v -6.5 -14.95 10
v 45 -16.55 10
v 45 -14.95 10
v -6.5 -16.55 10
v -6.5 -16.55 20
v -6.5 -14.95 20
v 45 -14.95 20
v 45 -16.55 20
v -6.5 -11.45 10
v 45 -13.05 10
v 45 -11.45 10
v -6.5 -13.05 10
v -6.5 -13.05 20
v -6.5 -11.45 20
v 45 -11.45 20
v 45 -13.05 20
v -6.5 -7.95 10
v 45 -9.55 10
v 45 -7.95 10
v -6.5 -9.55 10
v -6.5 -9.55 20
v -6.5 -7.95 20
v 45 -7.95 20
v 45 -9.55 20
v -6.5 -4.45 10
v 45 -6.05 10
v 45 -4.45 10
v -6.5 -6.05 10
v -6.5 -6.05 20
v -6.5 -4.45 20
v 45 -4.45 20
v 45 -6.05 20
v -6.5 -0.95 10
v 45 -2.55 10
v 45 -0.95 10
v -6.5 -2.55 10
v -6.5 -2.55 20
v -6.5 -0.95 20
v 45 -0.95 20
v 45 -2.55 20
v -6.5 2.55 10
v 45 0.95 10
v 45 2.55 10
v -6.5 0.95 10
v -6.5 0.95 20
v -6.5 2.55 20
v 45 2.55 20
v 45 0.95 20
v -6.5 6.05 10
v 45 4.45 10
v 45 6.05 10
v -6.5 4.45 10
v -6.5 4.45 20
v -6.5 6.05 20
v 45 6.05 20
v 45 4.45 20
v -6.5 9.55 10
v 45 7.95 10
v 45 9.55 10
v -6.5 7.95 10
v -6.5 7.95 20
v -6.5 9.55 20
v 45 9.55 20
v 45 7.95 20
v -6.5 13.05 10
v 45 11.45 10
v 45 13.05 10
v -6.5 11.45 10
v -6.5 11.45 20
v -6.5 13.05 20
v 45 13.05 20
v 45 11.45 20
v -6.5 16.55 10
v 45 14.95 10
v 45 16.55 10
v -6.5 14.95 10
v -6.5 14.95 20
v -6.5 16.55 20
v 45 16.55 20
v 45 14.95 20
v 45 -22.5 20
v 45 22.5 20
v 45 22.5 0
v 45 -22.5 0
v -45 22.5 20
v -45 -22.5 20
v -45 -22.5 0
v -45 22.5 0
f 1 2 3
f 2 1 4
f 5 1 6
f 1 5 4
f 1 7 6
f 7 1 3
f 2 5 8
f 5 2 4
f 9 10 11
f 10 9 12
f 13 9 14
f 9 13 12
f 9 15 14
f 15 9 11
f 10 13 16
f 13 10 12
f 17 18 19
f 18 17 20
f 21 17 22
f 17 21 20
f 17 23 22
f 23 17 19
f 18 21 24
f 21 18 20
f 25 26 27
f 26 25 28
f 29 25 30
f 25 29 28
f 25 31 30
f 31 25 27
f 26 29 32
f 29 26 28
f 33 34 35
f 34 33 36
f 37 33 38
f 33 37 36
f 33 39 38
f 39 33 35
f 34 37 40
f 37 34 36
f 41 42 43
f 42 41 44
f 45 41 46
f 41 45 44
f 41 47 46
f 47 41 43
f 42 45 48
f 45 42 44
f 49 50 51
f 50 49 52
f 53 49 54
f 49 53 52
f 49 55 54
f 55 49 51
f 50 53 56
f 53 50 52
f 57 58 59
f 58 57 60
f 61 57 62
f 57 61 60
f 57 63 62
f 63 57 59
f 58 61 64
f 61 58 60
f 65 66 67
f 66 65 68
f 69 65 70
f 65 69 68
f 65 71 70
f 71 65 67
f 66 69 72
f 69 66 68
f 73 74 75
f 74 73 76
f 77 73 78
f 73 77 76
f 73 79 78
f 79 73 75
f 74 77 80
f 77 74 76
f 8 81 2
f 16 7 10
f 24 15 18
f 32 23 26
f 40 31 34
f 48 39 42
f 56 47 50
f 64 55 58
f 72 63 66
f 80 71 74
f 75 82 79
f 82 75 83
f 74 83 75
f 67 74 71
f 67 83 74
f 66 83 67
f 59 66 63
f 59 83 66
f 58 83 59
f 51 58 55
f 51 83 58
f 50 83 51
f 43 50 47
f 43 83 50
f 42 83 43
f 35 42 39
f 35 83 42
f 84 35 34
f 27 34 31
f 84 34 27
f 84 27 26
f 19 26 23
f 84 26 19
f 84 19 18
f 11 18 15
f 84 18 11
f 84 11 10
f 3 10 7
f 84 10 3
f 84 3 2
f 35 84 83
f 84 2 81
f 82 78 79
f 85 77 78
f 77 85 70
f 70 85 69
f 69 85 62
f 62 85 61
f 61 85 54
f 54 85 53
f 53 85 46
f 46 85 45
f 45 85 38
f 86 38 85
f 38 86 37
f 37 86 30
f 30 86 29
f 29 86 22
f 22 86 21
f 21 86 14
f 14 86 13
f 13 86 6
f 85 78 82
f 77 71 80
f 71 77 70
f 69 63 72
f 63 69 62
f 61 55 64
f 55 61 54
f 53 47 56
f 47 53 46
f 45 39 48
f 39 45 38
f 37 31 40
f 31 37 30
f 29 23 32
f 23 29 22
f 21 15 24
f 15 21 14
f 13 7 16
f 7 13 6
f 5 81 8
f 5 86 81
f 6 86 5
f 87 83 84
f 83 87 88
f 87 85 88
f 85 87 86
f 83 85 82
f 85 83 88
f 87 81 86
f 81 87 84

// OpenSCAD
// Slide drying rack
// Print orientation: base block on XY plane, slots open upward (+Z)

// ---------- Block ----------
block_l = 90;    // block length along X (mm)
block_w = 45;    // block width along Y (mm)
block_h = 20;    // block height along Z (mm)

// ---------- Slots ----------
slot_n     = 10;   // number of slide slots
slot_len   = 77;   // slot length along X (mm)
slot_w     = 1.6;  // slot width along Y (mm)
slot_d     = 10;   // slot depth from top face (mm)
slot_pitch = 3.5;  // centre-to-centre spacing along Y (mm)

// ---------- Misc ----------
eps = 0.5;       // overcut past faces to avoid coplanar surfaces
$fn = 64;

// Derived
slot_x0 = -(block_l - slot_len) / 2;              // first slot start X
// Group of slot centres, centred on the block in X and Y
slot_ys = [for (i = [0 : slot_n - 1])
            slot_pitch * (i - (slot_n - 1) / 2)];

difference() {
    // Main block
    translate([-block_l / 2, -block_w / 2, 0])
        cube([block_l, block_w, block_h]);

    // Parallel slots, open at the top
    for (y = slot_ys)
        translate([slot_x0, y - slot_w / 2, block_h - slot_d])
            cube([slot_len, slot_w, slot_d + eps]);
}
